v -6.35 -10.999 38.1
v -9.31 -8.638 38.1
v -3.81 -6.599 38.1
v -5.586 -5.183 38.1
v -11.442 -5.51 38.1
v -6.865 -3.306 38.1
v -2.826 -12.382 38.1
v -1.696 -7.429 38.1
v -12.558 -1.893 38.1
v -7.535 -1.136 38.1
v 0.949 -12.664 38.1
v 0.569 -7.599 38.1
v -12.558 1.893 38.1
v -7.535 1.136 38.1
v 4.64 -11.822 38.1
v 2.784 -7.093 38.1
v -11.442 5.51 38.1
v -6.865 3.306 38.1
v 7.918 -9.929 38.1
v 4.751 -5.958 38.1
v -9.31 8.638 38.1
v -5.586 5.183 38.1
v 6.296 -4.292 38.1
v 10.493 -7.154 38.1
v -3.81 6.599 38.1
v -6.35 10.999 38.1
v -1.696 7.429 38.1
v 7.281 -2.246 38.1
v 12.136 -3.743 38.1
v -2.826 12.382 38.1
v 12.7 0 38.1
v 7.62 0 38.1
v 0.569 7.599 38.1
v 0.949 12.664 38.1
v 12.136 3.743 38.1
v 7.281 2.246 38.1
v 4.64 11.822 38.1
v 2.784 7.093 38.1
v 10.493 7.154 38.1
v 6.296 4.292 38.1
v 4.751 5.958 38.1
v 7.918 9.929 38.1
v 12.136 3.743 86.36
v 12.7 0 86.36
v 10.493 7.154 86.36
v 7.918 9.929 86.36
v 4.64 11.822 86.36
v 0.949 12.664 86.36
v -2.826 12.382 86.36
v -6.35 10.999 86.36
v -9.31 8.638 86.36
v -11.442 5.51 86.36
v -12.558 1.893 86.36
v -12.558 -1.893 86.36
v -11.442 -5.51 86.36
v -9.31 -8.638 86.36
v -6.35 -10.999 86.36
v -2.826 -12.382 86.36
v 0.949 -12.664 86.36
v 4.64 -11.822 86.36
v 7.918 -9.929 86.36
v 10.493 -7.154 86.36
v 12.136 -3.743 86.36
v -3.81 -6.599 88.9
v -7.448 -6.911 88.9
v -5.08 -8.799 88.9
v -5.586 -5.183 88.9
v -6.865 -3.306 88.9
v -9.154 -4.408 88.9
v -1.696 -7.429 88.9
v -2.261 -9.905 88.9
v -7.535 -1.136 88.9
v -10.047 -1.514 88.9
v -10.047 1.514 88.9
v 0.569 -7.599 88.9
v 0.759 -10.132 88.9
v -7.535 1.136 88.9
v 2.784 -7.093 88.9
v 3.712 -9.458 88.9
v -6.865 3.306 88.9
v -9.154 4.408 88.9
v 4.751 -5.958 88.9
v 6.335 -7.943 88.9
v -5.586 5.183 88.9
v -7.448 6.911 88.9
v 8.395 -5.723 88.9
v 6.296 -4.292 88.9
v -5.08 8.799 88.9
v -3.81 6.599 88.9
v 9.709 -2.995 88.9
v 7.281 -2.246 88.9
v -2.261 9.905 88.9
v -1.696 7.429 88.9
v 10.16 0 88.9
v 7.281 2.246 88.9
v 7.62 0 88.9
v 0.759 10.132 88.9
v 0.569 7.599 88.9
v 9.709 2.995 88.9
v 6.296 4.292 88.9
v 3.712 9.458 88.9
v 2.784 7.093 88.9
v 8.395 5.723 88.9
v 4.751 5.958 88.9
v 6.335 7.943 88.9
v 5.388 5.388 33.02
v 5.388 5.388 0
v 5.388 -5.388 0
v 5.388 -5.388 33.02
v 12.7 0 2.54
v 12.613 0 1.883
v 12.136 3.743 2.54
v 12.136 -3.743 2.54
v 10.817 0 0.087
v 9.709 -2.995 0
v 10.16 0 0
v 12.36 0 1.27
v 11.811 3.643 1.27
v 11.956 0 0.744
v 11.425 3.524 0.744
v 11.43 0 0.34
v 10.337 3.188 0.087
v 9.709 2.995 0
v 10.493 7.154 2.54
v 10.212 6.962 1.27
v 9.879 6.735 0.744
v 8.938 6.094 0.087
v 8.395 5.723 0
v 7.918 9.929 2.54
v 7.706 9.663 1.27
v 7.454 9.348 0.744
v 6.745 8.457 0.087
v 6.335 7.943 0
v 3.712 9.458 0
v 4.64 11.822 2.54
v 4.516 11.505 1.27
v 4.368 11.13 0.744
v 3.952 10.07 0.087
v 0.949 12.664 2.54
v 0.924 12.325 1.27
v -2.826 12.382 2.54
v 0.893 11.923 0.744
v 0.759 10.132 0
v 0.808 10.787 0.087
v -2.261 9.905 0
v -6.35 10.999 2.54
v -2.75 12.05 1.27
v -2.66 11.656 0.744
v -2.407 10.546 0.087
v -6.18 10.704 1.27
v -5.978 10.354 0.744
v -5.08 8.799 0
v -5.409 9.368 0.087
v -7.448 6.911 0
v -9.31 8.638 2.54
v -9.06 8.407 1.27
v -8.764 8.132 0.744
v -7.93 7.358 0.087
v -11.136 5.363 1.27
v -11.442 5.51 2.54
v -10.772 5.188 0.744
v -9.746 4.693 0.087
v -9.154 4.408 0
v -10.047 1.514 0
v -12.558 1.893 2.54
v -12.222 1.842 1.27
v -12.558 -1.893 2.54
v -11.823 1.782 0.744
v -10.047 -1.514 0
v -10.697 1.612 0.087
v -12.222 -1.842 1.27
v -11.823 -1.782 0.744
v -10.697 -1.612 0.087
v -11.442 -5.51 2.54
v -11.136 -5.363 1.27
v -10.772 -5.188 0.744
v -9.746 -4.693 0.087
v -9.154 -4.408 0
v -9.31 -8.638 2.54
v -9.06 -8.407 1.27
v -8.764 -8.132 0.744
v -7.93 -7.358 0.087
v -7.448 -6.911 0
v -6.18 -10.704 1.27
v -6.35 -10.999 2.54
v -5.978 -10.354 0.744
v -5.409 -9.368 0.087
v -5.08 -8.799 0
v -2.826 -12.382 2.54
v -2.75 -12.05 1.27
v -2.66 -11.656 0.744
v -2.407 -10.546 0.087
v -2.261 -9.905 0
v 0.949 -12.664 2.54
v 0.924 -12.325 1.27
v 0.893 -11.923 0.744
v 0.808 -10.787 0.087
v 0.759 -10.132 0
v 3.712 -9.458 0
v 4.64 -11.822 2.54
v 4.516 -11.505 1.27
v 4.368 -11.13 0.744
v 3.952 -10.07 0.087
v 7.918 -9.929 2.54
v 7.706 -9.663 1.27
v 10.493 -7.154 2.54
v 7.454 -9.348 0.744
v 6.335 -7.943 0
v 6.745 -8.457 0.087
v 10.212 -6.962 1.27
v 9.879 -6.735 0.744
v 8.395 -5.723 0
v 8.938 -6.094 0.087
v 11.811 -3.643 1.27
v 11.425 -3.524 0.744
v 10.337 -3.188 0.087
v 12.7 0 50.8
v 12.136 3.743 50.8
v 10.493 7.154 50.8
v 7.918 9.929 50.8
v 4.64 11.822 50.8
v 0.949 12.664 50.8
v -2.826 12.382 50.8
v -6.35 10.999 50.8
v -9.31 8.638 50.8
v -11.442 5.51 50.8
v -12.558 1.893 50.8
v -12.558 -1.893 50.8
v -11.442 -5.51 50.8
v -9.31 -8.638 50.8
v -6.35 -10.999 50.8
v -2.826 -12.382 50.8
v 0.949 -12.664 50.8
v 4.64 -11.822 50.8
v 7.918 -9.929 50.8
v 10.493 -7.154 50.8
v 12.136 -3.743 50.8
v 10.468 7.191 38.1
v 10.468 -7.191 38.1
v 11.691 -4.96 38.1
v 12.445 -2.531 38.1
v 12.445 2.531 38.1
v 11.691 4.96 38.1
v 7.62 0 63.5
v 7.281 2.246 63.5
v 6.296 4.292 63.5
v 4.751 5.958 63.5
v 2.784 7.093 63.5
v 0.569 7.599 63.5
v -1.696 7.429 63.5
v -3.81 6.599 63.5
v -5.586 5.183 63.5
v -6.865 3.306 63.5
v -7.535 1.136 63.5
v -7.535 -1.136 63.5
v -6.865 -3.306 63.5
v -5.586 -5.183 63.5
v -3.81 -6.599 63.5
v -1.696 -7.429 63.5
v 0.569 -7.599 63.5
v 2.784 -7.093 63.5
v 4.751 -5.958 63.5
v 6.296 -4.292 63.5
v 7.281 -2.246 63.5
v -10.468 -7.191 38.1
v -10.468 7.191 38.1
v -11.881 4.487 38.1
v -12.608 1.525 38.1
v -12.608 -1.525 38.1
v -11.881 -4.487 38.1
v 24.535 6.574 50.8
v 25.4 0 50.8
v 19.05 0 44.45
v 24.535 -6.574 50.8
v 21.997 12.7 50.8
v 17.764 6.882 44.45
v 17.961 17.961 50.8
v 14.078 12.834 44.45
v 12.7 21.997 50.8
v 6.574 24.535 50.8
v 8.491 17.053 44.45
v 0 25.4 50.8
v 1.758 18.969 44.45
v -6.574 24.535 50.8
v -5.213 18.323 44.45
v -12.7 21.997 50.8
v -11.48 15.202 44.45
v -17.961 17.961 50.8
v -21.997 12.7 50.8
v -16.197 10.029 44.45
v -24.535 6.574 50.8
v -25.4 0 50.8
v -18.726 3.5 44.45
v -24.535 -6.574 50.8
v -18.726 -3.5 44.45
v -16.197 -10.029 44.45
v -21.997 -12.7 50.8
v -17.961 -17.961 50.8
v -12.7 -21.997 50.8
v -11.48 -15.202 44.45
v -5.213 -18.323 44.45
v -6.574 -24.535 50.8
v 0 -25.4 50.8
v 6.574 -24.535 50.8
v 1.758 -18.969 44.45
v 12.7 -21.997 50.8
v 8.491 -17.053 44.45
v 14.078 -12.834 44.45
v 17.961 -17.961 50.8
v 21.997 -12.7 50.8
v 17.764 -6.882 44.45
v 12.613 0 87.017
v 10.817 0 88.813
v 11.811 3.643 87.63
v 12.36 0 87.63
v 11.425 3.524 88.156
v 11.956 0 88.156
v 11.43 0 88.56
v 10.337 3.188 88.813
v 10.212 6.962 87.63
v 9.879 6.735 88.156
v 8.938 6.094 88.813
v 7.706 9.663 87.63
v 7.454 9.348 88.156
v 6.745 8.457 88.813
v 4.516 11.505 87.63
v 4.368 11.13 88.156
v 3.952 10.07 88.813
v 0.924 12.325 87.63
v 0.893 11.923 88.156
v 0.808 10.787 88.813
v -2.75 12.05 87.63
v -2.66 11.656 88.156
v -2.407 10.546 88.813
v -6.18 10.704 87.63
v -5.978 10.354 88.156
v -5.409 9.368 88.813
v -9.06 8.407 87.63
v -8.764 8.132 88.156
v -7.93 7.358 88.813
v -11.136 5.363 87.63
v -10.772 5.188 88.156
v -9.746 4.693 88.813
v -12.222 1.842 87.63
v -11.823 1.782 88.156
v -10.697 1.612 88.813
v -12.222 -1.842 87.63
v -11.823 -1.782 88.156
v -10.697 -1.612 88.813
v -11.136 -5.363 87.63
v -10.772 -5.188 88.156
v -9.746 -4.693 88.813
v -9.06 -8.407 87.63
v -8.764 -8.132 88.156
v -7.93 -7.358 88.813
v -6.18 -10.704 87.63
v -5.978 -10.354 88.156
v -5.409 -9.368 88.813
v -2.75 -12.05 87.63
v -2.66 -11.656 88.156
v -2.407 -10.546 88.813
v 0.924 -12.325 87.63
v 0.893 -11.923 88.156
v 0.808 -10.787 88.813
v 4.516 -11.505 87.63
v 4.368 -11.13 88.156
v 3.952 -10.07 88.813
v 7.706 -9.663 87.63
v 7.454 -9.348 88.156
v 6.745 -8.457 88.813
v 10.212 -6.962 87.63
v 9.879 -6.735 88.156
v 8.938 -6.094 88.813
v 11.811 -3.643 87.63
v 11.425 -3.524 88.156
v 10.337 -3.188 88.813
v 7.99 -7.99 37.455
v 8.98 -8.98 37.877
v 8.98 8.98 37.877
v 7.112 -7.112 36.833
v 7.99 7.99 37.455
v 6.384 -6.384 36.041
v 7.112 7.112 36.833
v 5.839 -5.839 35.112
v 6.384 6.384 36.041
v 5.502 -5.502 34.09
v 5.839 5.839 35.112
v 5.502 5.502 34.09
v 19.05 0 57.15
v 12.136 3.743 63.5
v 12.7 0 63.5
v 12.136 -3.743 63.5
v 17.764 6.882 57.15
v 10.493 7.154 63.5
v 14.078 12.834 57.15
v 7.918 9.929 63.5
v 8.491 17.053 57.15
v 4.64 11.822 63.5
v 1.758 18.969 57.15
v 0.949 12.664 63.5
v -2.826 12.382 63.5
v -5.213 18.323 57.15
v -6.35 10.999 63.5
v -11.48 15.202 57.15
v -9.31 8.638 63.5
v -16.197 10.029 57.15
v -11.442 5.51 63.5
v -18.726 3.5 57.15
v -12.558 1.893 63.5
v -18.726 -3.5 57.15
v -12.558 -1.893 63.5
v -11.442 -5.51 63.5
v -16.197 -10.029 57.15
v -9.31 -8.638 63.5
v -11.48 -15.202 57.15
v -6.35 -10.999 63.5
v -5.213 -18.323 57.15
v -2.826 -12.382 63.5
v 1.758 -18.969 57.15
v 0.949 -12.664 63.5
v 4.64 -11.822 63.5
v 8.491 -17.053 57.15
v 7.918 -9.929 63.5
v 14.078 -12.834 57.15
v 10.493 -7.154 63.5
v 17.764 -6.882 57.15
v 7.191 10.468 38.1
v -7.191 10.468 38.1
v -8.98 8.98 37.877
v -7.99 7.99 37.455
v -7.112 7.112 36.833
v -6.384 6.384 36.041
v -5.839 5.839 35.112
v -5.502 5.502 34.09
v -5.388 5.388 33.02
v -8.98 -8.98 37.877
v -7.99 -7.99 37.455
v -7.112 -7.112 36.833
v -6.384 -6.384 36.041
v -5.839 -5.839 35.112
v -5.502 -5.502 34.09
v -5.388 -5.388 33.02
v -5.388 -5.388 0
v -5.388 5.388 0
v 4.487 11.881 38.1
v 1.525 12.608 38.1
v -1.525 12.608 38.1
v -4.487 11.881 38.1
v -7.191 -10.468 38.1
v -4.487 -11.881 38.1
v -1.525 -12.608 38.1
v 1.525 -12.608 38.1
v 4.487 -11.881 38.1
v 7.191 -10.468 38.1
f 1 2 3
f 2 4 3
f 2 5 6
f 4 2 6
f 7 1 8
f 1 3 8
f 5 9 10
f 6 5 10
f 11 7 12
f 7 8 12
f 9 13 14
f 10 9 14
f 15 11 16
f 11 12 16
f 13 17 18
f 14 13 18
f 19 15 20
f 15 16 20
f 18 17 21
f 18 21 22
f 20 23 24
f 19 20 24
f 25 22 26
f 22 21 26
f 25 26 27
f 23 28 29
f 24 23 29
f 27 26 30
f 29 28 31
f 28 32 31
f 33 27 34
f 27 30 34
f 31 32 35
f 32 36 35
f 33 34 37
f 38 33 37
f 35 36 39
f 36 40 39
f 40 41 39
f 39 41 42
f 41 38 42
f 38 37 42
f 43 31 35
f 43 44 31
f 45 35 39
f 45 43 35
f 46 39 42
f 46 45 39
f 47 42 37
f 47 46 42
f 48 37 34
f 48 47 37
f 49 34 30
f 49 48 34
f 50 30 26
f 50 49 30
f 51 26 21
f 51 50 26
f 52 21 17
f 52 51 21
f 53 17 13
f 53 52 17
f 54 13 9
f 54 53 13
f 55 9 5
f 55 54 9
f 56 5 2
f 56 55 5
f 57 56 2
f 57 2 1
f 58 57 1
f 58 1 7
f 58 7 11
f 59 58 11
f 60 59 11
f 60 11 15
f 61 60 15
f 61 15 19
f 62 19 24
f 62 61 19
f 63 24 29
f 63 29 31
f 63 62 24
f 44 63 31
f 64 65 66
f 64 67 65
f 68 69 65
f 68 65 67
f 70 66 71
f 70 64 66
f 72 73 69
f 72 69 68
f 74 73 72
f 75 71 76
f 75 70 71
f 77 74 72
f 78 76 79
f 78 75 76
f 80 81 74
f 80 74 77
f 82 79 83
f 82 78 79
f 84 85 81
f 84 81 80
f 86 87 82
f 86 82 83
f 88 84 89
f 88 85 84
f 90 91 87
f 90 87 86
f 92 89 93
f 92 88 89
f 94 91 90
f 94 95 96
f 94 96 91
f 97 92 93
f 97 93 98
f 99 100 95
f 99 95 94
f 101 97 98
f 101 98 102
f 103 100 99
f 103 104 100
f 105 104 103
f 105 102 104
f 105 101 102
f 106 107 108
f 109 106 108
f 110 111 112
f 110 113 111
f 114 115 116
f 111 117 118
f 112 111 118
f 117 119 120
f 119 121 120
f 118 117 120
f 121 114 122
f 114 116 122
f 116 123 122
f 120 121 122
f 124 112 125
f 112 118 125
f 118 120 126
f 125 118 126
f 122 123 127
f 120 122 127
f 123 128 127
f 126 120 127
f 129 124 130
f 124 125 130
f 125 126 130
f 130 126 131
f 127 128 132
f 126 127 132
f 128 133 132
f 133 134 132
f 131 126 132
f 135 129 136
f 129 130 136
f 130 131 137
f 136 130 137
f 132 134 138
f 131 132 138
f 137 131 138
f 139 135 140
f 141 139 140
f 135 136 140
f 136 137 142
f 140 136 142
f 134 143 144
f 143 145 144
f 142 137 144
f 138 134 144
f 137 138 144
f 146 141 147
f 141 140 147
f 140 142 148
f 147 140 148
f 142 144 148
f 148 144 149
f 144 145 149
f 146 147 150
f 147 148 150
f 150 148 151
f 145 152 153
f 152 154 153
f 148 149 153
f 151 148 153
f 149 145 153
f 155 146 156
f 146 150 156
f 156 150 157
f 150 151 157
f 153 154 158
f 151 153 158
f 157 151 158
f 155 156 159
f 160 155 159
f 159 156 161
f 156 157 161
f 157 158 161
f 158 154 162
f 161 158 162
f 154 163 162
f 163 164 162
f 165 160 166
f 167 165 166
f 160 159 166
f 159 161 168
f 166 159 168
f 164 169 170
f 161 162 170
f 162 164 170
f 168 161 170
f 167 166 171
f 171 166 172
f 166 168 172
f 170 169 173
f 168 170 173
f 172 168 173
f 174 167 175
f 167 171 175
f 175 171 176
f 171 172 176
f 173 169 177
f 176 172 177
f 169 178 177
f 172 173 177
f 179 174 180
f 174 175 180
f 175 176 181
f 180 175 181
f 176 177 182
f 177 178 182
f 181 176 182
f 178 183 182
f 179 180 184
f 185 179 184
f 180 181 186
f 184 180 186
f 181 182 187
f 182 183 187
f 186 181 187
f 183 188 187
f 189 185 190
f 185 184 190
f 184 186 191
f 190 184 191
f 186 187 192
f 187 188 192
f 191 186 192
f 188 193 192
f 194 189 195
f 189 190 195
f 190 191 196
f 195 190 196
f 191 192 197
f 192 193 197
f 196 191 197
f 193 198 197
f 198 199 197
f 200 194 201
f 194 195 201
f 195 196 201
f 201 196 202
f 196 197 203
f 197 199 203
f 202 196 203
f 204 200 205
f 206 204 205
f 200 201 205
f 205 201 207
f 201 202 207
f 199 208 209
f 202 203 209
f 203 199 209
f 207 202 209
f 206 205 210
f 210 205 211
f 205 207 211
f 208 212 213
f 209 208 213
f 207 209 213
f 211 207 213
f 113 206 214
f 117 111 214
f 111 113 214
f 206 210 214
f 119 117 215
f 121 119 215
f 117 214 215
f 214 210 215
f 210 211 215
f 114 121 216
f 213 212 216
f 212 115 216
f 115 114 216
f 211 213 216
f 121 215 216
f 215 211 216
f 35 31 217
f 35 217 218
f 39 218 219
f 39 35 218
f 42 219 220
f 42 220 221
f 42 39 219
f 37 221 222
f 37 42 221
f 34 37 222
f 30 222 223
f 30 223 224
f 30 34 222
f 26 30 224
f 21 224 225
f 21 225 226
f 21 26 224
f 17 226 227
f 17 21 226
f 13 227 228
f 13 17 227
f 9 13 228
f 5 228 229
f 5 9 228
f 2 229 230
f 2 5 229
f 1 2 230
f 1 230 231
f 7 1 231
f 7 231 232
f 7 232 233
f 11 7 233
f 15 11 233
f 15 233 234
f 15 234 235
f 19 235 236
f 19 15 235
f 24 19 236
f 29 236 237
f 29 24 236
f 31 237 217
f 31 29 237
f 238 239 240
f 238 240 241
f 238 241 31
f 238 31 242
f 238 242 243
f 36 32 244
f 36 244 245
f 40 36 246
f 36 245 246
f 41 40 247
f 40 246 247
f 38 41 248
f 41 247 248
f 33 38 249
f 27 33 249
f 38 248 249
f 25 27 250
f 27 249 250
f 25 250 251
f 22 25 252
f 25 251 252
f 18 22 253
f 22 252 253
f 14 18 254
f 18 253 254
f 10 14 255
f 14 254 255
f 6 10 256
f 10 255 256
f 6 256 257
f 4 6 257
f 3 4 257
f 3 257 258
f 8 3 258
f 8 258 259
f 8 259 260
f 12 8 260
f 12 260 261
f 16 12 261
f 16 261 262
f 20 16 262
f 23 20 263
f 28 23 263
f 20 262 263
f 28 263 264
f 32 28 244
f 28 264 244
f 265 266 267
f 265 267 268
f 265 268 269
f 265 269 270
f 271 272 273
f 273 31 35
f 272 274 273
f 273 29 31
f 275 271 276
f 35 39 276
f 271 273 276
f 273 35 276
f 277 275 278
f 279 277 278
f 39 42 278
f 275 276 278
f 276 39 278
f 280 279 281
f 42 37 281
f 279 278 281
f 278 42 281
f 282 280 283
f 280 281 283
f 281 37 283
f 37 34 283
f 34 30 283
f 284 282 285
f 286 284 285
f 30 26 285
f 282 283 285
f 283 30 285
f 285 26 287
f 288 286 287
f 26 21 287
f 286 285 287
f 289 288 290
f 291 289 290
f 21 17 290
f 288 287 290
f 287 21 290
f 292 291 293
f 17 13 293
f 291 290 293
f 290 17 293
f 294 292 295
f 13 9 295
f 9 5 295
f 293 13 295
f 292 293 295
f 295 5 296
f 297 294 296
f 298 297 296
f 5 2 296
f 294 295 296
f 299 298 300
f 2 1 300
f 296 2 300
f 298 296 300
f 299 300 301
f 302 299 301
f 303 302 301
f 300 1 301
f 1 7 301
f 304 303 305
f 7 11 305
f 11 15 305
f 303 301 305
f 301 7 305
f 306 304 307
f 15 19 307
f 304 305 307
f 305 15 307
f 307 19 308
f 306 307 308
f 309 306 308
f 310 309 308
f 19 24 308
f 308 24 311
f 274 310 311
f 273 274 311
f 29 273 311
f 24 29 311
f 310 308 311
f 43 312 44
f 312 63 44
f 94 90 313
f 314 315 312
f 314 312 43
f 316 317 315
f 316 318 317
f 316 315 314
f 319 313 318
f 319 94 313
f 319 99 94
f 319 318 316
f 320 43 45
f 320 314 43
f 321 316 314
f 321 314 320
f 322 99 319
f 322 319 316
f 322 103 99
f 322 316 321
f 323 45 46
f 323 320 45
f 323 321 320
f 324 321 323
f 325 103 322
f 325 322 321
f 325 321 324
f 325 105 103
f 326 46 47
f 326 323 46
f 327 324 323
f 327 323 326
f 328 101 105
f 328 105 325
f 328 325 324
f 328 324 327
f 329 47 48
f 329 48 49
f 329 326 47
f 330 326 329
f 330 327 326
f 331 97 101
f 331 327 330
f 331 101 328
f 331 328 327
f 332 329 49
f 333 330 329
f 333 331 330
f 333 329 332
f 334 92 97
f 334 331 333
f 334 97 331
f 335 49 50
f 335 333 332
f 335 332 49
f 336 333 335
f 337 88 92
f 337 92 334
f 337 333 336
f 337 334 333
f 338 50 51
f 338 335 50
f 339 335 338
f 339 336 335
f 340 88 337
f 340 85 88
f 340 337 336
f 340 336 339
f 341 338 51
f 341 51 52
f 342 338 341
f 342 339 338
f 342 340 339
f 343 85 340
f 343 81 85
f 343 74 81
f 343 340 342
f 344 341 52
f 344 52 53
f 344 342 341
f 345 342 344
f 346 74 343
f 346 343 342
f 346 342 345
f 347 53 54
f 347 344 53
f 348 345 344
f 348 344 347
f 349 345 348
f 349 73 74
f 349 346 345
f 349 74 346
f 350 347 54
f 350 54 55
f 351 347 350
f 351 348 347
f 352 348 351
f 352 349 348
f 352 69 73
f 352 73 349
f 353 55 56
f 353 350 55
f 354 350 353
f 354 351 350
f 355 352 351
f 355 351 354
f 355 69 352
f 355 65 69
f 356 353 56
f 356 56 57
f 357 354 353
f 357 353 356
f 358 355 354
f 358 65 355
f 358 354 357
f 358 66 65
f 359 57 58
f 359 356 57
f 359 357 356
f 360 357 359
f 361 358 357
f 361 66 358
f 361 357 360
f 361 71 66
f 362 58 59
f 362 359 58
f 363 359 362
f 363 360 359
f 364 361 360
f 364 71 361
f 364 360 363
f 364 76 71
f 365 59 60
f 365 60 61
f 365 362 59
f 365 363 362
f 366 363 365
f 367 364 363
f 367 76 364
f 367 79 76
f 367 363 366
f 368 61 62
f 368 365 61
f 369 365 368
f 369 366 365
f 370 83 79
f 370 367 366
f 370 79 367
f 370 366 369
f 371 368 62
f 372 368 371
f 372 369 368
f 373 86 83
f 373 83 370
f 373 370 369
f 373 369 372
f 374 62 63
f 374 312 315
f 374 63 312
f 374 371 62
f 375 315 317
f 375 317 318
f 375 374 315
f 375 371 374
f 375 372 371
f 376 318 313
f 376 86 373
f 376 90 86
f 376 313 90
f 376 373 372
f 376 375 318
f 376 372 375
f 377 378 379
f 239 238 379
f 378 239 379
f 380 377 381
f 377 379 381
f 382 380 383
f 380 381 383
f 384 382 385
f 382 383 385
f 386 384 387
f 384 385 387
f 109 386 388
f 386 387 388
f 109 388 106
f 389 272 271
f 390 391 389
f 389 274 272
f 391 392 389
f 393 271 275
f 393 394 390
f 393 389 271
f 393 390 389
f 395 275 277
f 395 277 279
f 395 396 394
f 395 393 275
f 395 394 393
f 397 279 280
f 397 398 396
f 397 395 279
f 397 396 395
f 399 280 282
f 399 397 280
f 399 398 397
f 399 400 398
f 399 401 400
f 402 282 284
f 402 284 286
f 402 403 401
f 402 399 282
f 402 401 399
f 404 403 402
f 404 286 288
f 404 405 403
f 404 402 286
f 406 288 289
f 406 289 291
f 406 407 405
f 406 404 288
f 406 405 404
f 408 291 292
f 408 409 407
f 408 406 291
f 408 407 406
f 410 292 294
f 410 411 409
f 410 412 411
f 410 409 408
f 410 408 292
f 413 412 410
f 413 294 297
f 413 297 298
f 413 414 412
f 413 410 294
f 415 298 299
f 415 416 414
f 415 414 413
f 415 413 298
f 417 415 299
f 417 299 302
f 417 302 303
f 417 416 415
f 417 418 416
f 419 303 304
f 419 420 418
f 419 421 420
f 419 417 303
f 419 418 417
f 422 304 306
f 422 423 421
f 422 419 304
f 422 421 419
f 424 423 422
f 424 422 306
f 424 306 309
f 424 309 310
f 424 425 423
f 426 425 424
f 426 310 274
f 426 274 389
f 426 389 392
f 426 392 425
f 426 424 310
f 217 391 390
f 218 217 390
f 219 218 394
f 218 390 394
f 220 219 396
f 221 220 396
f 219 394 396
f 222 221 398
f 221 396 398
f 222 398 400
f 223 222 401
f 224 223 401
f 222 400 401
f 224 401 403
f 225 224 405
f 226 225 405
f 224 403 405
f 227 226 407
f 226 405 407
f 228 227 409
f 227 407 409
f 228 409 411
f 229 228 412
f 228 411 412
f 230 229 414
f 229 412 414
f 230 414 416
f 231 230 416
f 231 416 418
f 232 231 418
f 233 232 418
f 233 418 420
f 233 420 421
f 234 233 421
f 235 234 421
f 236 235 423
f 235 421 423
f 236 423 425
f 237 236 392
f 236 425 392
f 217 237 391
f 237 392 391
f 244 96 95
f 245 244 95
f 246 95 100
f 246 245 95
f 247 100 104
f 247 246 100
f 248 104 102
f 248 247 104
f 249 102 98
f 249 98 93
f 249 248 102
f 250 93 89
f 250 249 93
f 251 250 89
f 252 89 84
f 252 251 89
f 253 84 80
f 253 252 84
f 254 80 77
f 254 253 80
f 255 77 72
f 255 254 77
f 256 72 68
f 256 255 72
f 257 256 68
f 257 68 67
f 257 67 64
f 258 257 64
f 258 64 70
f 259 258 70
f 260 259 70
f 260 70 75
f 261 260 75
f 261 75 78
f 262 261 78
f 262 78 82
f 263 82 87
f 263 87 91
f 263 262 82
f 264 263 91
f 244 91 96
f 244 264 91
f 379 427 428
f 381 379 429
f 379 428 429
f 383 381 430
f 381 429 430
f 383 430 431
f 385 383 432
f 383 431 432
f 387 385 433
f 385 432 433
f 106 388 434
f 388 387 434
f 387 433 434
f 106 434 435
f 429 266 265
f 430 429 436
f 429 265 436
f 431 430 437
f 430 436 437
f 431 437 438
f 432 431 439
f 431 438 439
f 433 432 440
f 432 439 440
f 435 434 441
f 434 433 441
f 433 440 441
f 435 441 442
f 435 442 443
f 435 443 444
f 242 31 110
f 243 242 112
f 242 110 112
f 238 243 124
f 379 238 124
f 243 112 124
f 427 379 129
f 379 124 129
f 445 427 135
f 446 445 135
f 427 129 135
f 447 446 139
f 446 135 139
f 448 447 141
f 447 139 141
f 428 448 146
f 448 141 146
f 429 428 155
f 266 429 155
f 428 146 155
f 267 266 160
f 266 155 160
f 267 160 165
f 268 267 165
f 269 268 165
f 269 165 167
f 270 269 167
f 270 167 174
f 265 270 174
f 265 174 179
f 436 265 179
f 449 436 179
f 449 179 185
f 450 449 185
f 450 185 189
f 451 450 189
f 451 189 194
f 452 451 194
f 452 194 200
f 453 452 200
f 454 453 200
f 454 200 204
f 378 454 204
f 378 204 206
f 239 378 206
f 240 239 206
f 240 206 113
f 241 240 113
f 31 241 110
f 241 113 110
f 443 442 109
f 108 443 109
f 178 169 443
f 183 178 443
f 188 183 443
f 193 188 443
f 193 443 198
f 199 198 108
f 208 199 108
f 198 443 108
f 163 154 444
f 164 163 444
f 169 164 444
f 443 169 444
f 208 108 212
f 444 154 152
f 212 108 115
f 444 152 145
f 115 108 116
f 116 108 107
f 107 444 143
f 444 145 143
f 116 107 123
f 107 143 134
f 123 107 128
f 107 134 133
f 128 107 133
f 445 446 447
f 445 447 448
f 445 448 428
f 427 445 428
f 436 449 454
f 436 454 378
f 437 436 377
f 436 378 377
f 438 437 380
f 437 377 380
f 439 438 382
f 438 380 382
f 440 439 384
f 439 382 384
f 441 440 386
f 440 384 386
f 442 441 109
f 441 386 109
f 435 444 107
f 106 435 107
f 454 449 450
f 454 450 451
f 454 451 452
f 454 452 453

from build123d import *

# Parameters (mm, degrees)
F0_R         = 12.7
F1_DEPTH     = 38.1
F2_R         = 25.4
F2_R_2       = 12.7
F3_DEPTH     = 12.7
F4_R         = 2.54
F5_T1_DEPTH  = 10.7763073453
F5_T3_DEPTH  = 10.7763073453
F5_T9_DEPTH  = 23.4763073453
F5_S10_R     = 12.7
F5_T11_DEPTH = 14
F5_T15_DEPTH = 23.4763073453
F5_S16_R     = 12.7
F5_T17_DEPTH = 14
F5_T24_DEPTH = 23.4763073453
F5_S25_R     = 12.7
F5_T26_DEPTH = 14
F5_T30_DEPTH = 23.4763073453
F5_S31_R     = 12.7
F5_T32_DEPTH = 14
F5_T39_DEPTH = 23.4763073453
F5_S40_R     = 12.7
F5_T41_DEPTH = 14
F5_T45_DEPTH = 23.4763073453
F5_S46_R     = 12.7
F5_T47_DEPTH = 14
F5_T54_DEPTH = 23.4763073453
F5_S55_R     = 12.7
F5_T56_DEPTH = 14
F5_T60_DEPTH = 23.4763073453
F5_S61_R     = 12.7
F5_T62_DEPTH = 14
F8_R         = 12.7
F8_R_2       = 7.62
F9_DEPTH     = 25.4
F10_R        = 2.54
F11_DEPTH    = 25.4
F12_SIZE     = 12.69999


# Not quite as in the source:
# - a fillet or chamfer that OpenCascade refuses, or shapes differently, is made with other operations: its cross-section is extruded or revolved along the edge and cut away or added
# - a fillet or chamfer is up to 0.001 mm smaller than in the source, because OpenCascade refuses the exact size


with BuildPart() as f1:
    # F0 (on Top) → F1 (new body)
    with BuildSketch(Plane.XY):
        Circle(F0_R)
        with BuildLine():
            ThreePointArc((5.3881536726, 5.3881536726), (7.0399620377, 2.9160477546), (7.62, 0))
            ThreePointArc((7.62, 0), (7.0399620377, -2.9160477546), (5.3881536726, -5.3881536726))
            ThreePointArc((5.3881536726, -5.3881536726), (0, -7.62), (-5.3881536726, -5.3881536726))
            ThreePointArc((-5.3881536726, -5.3881536726), (-7.62, 0), (-5.3881536726, 5.3881536726))
            ThreePointArc((-5.3881536726, 5.3881536726), (0, 7.62), (5.3881536726, 5.3881536726))
        make_face(mode=Mode.SUBTRACT)
        with BuildLine():
            ThreePointArc((-5.3881536726, -5.3881536726), (0, -7.62), (5.3881536726, -5.3881536726))
            Line((5.3881536726, -5.3881536726), (-5.3881536726, -5.3881536726))
        make_face()
        with BuildLine():
            Line((-5.3881536726, -5.3881536726), (-5.3881536726, 5.3881536726))
            ThreePointArc((-5.3881536726, 5.3881536726), (-7.62, 0), (-5.3881536726, -5.3881536726))
        make_face()
        with BuildLine():
            ThreePointArc((5.3881536726, -5.3881536726), (7.0399620377, -2.9160477546), (7.62, 0))
            ThreePointArc((7.62, 0), (7.0399620377, 2.9160477546), (5.3881536726, 5.3881536726))
            Line((5.3881536726, 5.3881536726), (5.3881536726, -5.3881536726))
        make_face()
        with BuildLine():
            Line((-5.3881536726, 5.3881536726), (5.3881536726, 5.3881536726))
            ThreePointArc((5.3881536726, 5.3881536726), (0, 7.62), (-5.3881536726, 5.3881536726))
        make_face()
    extrude(amount=F1_DEPTH)

    # F4
    f4_edges = [f1.edges().sort_by_distance(p)[0] for p in [
        (-12.7, 0, 0),
    ]]
    fillet(f4_edges, radius=F4_R)

    # F5: fillet of radius 5.08 on 4 edges, made by hand

    # F5_s2 → F5_t1 (cut)
    with BuildSketch(Plane.XZ.offset(-5.3881536726)):
        with BuildLine():
            ThreePointArc((10.4681536726, 38.1), (6.8760512242, 36.6121024484), (5.3881536726, 33.02))
            Line((5.3881536726, 33.02), (5.3881536726, 38.1))
            Line((5.3881536726, 38.1), (10.4681536726, 38.1))
        make_face()
        with BuildLine():
            ThreePointArc((-10.4681536726, 38.1), (-6.8760512242, 36.6121024484), (-5.3881536726, 33.02))
            Line((-5.3881536726, 33.02), (-5.3881536726, 38.1))
            Line((-5.3881536726, 38.1), (-10.4681536726, 38.1))
        make_face()
    extrude(amount=F5_T1_DEPTH, mode=Mode.SUBTRACT)

    # F5_s4 → F5_t3 (cut)
    with BuildSketch(Plane.YZ.offset(-5.3881536726)):
        with BuildLine():
            ThreePointArc((-10.4681536726, 38.1), (-6.8760512242, 36.6121024484), (-5.3881536726, 33.02))
            Line((-5.3881536726, 33.02), (-5.3881536726, 38.1))
            Line((-5.3881536726, 38.1), (-10.4681536726, 38.1))
        make_face()
        with BuildLine():
            ThreePointArc((10.4681536726, 38.1), (6.8760512242, 36.6121024484), (5.3881536726, 33.02))
            Line((5.3881536726, 33.02), (5.3881536726, 38.1))
            Line((5.3881536726, 38.1), (10.4681536726, 38.1))
        make_face()
    extrude(amount=F5_T3_DEPTH, mode=Mode.SUBTRACT)


with BuildPart() as f3:
    # F2 (on face) → F3 (new body)
    with BuildSketch(Plane.XY.offset(38.1)):
        Circle(F2_R)
        Circle(F2_R_2, mode=Mode.SUBTRACT)
    extrude(amount=F3_DEPTH)

    # F6: F3 across face


with BuildPart() as f5_tool7:
    # F5_s8 → F5_t9 (new body)
    with BuildSketch(Plane.YZ.offset(-5.3881536726)):
        with BuildLine():
            ThreePointArc((10.4681536726, 38.1), (6.8760512242, 36.6121024484), (5.3881536726, 33.02))
            Line((5.3881536726, 33.02), (5.3881536726, 38.1))
            Line((5.3881536726, 38.1), (10.4681536726, 38.1))
        make_face()
    extrude(amount=F5_T9_DEPTH)

    # F5_s10 → F5_t11 (intersect, symmetric)
    with BuildSketch(Plane.XY.offset(35.6)):
        Circle(F5_S10_R)
    extrude(amount=F5_T11_DEPTH, both=True, mode=Mode.INTERSECT)

    split(bisect_by=Plane.YZ.offset(5.3881536726), keep=Keep.TOP)


with BuildPart() as f5_tool13:
    # F5_s14 → F5_t15 (new body)
    with BuildSketch(Plane.XZ.offset(-18.0881536726)):
        with BuildLine():
            ThreePointArc((10.4681536726, 38.1), (6.8760512242, 36.6121024484), (5.3881536726, 33.02))
            Line((5.3881536726, 33.02), (5.3881536726, 38.1))
            Line((5.3881536726, 38.1), (10.4681536726, 38.1))
        make_face()
    extrude(amount=F5_T15_DEPTH)

    # F5_s16 → F5_t17 (intersect, symmetric)
    with BuildSketch(Plane.XY.offset(35.6)):
        Circle(F5_S16_R)
    extrude(amount=F5_T17_DEPTH, both=True, mode=Mode.INTERSECT)

    split(bisect_by=Plane.XZ.offset(-5.3881536726), keep=Keep.BOTTOM)


with BuildPart() as f5_tool7_1:
    add(f5_tool7.part)

    # F5_t19: intersect F5_tool13
    add(f5_tool13.part, mode=Mode.INTERSECT)


with BuildPart() as f1_1:
    add(f1.part)

    # F5_t5: cut F5_tool7
    add(f5_tool7_1.part, mode=Mode.SUBTRACT)


with BuildPart() as f5_tool22:
    # F5_s23 → F5_t24 (new body)
    with BuildSketch(Plane.YZ.offset(18.0881536726)):
        with BuildLine():
            ThreePointArc((-10.4681536726, 38.1), (-6.8760512242, 36.6121024484), (-5.3881536726, 33.02))
            Line((-5.3881536726, 33.02), (-5.3881536726, 38.1))
            Line((-5.3881536726, 38.1), (-10.4681536726, 38.1))
        make_face()
    extrude(amount=-F5_T24_DEPTH)

    # F5_s25 → F5_t26 (intersect, symmetric)
    with BuildSketch(Plane.XY.offset(35.6)):
        Circle(F5_S25_R)
    extrude(amount=F5_T26_DEPTH, both=True, mode=Mode.INTERSECT)

    split(bisect_by=Plane.YZ.offset(5.3881536726), keep=Keep.TOP)


with BuildPart() as f5_tool28:
    # F5_s29 → F5_t30 (new body)
    with BuildSketch(Plane.XZ.offset(-5.3881536726)):
        with BuildLine():
            ThreePointArc((10.4681536726, 38.1), (6.8760512242, 36.6121024484), (5.3881536726, 33.02))
            Line((5.3881536726, 33.02), (5.3881536726, 38.1))
            Line((5.3881536726, 38.1), (10.4681536726, 38.1))
        make_face()
    extrude(amount=F5_T30_DEPTH)

    # F5_s31 → F5_t32 (intersect, symmetric)
    with BuildSketch(Plane.XY.offset(35.6)):
        Circle(F5_S31_R)
    extrude(amount=F5_T32_DEPTH, both=True, mode=Mode.INTERSECT)

    split(bisect_by=Plane.XZ.offset(5.3881536726), keep=Keep.TOP)


with BuildPart() as f5_tool22_1:
    add(f5_tool22.part)

    # F5_t34: intersect F5_tool28
    add(f5_tool28.part, mode=Mode.INTERSECT)


with BuildPart() as f1_2:
    add(f1_1.part)

    # F5_t20: cut F5_tool22
    add(f5_tool22_1.part, mode=Mode.SUBTRACT)


with BuildPart() as f5_tool37:
    # F5_s38 → F5_t39 (new body)
    with BuildSketch(Plane.YZ.offset(5.3881536726)):
        with BuildLine():
            ThreePointArc((-10.4681536726, 38.1), (-6.8760512242, 36.6121024484), (-5.3881536726, 33.02))
            Line((-5.3881536726, 33.02), (-5.3881536726, 38.1))
            Line((-5.3881536726, 38.1), (-10.4681536726, 38.1))
        make_face()
    extrude(amount=-F5_T39_DEPTH)

    # F5_s40 → F5_t41 (intersect, symmetric)
    with BuildSketch(Plane.XY.offset(35.6)):
        Circle(F5_S40_R)
    extrude(amount=F5_T41_DEPTH, both=True, mode=Mode.INTERSECT)

    split(bisect_by=Plane.YZ.offset(-5.3881536726), keep=Keep.BOTTOM)


with BuildPart() as f5_tool43:
    # F5_s44 → F5_t45 (new body)
    with BuildSketch(Plane.XZ.offset(18.0881536726)):
        with BuildLine():
            ThreePointArc((-10.4681536726, 38.1), (-6.8760512242, 36.6121024484), (-5.3881536726, 33.02))
            Line((-5.3881536726, 33.02), (-5.3881536726, 38.1))
            Line((-5.3881536726, 38.1), (-10.4681536726, 38.1))
        make_face()
    extrude(amount=-F5_T45_DEPTH)

    # F5_s46 → F5_t47 (intersect, symmetric)
    with BuildSketch(Plane.XY.offset(35.6)):
        Circle(F5_S46_R)
    extrude(amount=F5_T47_DEPTH, both=True, mode=Mode.INTERSECT)

    split(bisect_by=Plane.XZ.offset(5.3881536726), keep=Keep.TOP)


with BuildPart() as f5_tool37_1:
    add(f5_tool37.part)

    # F5_t49: intersect F5_tool43
    add(f5_tool43.part, mode=Mode.INTERSECT)


with BuildPart() as f1_3:
    add(f1_2.part)

    # F5_t35: cut F5_tool37
    add(f5_tool37_1.part, mode=Mode.SUBTRACT)


with BuildPart() as f5_tool52:
    # F5_s53 → F5_t54 (new body)
    with BuildSketch(Plane.XZ.offset(5.3881536726)):
        with BuildLine():
            ThreePointArc((-10.4681536726, 38.1), (-6.8760512242, 36.6121024484), (-5.3881536726, 33.02))
            Line((-5.3881536726, 33.02), (-5.3881536726, 38.1))
            Line((-5.3881536726, 38.1), (-10.4681536726, 38.1))
        make_face()
    extrude(amount=-F5_T54_DEPTH)

    # F5_s55 → F5_t56 (intersect, symmetric)
    with BuildSketch(Plane.XY.offset(35.6)):
        Circle(F5_S55_R)
    extrude(amount=F5_T56_DEPTH, both=True, mode=Mode.INTERSECT)

    split(bisect_by=Plane.XZ.offset(-5.3881536726), keep=Keep.BOTTOM)


with BuildPart() as f5_tool58:
    # F5_s59 → F5_t60 (new body)
    with BuildSketch(Plane.YZ.offset(-18.0881536726)):
        with BuildLine():
            ThreePointArc((10.4681536726, 38.1), (6.8760512242, 36.6121024484), (5.3881536726, 33.02))
            Line((5.3881536726, 33.02), (5.3881536726, 38.1))
            Line((5.3881536726, 38.1), (10.4681536726, 38.1))
        make_face()
    extrude(amount=F5_T60_DEPTH)

    # F5_s61 → F5_t62 (intersect, symmetric)
    with BuildSketch(Plane.XY.offset(35.6)):
        Circle(F5_S61_R)
    extrude(amount=F5_T62_DEPTH, both=True, mode=Mode.INTERSECT)

    split(bisect_by=Plane.YZ.offset(-5.3881536726), keep=Keep.BOTTOM)


with BuildPart() as f5_tool52_1:
    add(f5_tool52.part)

    # F5_t64: intersect F5_tool58
    add(f5_tool58.part, mode=Mode.INTERSECT)


with BuildPart() as f1_4:
    add(f1_3.part)

    # F5_t50: cut F5_tool52
    add(f5_tool52_1.part, mode=Mode.SUBTRACT)


with BuildPart() as f3_1:
    add(f3.part)
    add(f3.part.mirror(Plane.XY.offset(50.8)))

    # F12 (size 12.7 in the source; OpenCascade refuses exactly that, so slightly less here)
    f12_edges = [f3_1.edges().sort_by_distance(p)[0] for p in [
        (-25.4, 0, 38.1),
        (-25.4, 0, 63.5),
    ]]
    chamfer(f12_edges, length=F12_SIZE)


with BuildPart() as f9:
    # F8 (on offset) → F9 (new body)
    with BuildSketch(Plane.XY.offset(63.5)):
        Circle(F8_R)
        Circle(F8_R_2, mode=Mode.SUBTRACT)
    extrude(amount=F9_DEPTH)

    # F10
    f10_edges = [f9.edges().sort_by_distance(p)[0] for p in [
        (-12.7, 0, 88.9),
    ]]
    fillet(f10_edges, radius=F10_R)

    # F8 (on offset) → F11 (join)
    with BuildSketch(Plane.XY.offset(63.5)):
        Circle(F8_R)
        Circle(F8_R_2, mode=Mode.SUBTRACT)
    extrude(amount=-F11_DEPTH)


solid = Compound([f1_4.part, f3_1.part, f9.part])
